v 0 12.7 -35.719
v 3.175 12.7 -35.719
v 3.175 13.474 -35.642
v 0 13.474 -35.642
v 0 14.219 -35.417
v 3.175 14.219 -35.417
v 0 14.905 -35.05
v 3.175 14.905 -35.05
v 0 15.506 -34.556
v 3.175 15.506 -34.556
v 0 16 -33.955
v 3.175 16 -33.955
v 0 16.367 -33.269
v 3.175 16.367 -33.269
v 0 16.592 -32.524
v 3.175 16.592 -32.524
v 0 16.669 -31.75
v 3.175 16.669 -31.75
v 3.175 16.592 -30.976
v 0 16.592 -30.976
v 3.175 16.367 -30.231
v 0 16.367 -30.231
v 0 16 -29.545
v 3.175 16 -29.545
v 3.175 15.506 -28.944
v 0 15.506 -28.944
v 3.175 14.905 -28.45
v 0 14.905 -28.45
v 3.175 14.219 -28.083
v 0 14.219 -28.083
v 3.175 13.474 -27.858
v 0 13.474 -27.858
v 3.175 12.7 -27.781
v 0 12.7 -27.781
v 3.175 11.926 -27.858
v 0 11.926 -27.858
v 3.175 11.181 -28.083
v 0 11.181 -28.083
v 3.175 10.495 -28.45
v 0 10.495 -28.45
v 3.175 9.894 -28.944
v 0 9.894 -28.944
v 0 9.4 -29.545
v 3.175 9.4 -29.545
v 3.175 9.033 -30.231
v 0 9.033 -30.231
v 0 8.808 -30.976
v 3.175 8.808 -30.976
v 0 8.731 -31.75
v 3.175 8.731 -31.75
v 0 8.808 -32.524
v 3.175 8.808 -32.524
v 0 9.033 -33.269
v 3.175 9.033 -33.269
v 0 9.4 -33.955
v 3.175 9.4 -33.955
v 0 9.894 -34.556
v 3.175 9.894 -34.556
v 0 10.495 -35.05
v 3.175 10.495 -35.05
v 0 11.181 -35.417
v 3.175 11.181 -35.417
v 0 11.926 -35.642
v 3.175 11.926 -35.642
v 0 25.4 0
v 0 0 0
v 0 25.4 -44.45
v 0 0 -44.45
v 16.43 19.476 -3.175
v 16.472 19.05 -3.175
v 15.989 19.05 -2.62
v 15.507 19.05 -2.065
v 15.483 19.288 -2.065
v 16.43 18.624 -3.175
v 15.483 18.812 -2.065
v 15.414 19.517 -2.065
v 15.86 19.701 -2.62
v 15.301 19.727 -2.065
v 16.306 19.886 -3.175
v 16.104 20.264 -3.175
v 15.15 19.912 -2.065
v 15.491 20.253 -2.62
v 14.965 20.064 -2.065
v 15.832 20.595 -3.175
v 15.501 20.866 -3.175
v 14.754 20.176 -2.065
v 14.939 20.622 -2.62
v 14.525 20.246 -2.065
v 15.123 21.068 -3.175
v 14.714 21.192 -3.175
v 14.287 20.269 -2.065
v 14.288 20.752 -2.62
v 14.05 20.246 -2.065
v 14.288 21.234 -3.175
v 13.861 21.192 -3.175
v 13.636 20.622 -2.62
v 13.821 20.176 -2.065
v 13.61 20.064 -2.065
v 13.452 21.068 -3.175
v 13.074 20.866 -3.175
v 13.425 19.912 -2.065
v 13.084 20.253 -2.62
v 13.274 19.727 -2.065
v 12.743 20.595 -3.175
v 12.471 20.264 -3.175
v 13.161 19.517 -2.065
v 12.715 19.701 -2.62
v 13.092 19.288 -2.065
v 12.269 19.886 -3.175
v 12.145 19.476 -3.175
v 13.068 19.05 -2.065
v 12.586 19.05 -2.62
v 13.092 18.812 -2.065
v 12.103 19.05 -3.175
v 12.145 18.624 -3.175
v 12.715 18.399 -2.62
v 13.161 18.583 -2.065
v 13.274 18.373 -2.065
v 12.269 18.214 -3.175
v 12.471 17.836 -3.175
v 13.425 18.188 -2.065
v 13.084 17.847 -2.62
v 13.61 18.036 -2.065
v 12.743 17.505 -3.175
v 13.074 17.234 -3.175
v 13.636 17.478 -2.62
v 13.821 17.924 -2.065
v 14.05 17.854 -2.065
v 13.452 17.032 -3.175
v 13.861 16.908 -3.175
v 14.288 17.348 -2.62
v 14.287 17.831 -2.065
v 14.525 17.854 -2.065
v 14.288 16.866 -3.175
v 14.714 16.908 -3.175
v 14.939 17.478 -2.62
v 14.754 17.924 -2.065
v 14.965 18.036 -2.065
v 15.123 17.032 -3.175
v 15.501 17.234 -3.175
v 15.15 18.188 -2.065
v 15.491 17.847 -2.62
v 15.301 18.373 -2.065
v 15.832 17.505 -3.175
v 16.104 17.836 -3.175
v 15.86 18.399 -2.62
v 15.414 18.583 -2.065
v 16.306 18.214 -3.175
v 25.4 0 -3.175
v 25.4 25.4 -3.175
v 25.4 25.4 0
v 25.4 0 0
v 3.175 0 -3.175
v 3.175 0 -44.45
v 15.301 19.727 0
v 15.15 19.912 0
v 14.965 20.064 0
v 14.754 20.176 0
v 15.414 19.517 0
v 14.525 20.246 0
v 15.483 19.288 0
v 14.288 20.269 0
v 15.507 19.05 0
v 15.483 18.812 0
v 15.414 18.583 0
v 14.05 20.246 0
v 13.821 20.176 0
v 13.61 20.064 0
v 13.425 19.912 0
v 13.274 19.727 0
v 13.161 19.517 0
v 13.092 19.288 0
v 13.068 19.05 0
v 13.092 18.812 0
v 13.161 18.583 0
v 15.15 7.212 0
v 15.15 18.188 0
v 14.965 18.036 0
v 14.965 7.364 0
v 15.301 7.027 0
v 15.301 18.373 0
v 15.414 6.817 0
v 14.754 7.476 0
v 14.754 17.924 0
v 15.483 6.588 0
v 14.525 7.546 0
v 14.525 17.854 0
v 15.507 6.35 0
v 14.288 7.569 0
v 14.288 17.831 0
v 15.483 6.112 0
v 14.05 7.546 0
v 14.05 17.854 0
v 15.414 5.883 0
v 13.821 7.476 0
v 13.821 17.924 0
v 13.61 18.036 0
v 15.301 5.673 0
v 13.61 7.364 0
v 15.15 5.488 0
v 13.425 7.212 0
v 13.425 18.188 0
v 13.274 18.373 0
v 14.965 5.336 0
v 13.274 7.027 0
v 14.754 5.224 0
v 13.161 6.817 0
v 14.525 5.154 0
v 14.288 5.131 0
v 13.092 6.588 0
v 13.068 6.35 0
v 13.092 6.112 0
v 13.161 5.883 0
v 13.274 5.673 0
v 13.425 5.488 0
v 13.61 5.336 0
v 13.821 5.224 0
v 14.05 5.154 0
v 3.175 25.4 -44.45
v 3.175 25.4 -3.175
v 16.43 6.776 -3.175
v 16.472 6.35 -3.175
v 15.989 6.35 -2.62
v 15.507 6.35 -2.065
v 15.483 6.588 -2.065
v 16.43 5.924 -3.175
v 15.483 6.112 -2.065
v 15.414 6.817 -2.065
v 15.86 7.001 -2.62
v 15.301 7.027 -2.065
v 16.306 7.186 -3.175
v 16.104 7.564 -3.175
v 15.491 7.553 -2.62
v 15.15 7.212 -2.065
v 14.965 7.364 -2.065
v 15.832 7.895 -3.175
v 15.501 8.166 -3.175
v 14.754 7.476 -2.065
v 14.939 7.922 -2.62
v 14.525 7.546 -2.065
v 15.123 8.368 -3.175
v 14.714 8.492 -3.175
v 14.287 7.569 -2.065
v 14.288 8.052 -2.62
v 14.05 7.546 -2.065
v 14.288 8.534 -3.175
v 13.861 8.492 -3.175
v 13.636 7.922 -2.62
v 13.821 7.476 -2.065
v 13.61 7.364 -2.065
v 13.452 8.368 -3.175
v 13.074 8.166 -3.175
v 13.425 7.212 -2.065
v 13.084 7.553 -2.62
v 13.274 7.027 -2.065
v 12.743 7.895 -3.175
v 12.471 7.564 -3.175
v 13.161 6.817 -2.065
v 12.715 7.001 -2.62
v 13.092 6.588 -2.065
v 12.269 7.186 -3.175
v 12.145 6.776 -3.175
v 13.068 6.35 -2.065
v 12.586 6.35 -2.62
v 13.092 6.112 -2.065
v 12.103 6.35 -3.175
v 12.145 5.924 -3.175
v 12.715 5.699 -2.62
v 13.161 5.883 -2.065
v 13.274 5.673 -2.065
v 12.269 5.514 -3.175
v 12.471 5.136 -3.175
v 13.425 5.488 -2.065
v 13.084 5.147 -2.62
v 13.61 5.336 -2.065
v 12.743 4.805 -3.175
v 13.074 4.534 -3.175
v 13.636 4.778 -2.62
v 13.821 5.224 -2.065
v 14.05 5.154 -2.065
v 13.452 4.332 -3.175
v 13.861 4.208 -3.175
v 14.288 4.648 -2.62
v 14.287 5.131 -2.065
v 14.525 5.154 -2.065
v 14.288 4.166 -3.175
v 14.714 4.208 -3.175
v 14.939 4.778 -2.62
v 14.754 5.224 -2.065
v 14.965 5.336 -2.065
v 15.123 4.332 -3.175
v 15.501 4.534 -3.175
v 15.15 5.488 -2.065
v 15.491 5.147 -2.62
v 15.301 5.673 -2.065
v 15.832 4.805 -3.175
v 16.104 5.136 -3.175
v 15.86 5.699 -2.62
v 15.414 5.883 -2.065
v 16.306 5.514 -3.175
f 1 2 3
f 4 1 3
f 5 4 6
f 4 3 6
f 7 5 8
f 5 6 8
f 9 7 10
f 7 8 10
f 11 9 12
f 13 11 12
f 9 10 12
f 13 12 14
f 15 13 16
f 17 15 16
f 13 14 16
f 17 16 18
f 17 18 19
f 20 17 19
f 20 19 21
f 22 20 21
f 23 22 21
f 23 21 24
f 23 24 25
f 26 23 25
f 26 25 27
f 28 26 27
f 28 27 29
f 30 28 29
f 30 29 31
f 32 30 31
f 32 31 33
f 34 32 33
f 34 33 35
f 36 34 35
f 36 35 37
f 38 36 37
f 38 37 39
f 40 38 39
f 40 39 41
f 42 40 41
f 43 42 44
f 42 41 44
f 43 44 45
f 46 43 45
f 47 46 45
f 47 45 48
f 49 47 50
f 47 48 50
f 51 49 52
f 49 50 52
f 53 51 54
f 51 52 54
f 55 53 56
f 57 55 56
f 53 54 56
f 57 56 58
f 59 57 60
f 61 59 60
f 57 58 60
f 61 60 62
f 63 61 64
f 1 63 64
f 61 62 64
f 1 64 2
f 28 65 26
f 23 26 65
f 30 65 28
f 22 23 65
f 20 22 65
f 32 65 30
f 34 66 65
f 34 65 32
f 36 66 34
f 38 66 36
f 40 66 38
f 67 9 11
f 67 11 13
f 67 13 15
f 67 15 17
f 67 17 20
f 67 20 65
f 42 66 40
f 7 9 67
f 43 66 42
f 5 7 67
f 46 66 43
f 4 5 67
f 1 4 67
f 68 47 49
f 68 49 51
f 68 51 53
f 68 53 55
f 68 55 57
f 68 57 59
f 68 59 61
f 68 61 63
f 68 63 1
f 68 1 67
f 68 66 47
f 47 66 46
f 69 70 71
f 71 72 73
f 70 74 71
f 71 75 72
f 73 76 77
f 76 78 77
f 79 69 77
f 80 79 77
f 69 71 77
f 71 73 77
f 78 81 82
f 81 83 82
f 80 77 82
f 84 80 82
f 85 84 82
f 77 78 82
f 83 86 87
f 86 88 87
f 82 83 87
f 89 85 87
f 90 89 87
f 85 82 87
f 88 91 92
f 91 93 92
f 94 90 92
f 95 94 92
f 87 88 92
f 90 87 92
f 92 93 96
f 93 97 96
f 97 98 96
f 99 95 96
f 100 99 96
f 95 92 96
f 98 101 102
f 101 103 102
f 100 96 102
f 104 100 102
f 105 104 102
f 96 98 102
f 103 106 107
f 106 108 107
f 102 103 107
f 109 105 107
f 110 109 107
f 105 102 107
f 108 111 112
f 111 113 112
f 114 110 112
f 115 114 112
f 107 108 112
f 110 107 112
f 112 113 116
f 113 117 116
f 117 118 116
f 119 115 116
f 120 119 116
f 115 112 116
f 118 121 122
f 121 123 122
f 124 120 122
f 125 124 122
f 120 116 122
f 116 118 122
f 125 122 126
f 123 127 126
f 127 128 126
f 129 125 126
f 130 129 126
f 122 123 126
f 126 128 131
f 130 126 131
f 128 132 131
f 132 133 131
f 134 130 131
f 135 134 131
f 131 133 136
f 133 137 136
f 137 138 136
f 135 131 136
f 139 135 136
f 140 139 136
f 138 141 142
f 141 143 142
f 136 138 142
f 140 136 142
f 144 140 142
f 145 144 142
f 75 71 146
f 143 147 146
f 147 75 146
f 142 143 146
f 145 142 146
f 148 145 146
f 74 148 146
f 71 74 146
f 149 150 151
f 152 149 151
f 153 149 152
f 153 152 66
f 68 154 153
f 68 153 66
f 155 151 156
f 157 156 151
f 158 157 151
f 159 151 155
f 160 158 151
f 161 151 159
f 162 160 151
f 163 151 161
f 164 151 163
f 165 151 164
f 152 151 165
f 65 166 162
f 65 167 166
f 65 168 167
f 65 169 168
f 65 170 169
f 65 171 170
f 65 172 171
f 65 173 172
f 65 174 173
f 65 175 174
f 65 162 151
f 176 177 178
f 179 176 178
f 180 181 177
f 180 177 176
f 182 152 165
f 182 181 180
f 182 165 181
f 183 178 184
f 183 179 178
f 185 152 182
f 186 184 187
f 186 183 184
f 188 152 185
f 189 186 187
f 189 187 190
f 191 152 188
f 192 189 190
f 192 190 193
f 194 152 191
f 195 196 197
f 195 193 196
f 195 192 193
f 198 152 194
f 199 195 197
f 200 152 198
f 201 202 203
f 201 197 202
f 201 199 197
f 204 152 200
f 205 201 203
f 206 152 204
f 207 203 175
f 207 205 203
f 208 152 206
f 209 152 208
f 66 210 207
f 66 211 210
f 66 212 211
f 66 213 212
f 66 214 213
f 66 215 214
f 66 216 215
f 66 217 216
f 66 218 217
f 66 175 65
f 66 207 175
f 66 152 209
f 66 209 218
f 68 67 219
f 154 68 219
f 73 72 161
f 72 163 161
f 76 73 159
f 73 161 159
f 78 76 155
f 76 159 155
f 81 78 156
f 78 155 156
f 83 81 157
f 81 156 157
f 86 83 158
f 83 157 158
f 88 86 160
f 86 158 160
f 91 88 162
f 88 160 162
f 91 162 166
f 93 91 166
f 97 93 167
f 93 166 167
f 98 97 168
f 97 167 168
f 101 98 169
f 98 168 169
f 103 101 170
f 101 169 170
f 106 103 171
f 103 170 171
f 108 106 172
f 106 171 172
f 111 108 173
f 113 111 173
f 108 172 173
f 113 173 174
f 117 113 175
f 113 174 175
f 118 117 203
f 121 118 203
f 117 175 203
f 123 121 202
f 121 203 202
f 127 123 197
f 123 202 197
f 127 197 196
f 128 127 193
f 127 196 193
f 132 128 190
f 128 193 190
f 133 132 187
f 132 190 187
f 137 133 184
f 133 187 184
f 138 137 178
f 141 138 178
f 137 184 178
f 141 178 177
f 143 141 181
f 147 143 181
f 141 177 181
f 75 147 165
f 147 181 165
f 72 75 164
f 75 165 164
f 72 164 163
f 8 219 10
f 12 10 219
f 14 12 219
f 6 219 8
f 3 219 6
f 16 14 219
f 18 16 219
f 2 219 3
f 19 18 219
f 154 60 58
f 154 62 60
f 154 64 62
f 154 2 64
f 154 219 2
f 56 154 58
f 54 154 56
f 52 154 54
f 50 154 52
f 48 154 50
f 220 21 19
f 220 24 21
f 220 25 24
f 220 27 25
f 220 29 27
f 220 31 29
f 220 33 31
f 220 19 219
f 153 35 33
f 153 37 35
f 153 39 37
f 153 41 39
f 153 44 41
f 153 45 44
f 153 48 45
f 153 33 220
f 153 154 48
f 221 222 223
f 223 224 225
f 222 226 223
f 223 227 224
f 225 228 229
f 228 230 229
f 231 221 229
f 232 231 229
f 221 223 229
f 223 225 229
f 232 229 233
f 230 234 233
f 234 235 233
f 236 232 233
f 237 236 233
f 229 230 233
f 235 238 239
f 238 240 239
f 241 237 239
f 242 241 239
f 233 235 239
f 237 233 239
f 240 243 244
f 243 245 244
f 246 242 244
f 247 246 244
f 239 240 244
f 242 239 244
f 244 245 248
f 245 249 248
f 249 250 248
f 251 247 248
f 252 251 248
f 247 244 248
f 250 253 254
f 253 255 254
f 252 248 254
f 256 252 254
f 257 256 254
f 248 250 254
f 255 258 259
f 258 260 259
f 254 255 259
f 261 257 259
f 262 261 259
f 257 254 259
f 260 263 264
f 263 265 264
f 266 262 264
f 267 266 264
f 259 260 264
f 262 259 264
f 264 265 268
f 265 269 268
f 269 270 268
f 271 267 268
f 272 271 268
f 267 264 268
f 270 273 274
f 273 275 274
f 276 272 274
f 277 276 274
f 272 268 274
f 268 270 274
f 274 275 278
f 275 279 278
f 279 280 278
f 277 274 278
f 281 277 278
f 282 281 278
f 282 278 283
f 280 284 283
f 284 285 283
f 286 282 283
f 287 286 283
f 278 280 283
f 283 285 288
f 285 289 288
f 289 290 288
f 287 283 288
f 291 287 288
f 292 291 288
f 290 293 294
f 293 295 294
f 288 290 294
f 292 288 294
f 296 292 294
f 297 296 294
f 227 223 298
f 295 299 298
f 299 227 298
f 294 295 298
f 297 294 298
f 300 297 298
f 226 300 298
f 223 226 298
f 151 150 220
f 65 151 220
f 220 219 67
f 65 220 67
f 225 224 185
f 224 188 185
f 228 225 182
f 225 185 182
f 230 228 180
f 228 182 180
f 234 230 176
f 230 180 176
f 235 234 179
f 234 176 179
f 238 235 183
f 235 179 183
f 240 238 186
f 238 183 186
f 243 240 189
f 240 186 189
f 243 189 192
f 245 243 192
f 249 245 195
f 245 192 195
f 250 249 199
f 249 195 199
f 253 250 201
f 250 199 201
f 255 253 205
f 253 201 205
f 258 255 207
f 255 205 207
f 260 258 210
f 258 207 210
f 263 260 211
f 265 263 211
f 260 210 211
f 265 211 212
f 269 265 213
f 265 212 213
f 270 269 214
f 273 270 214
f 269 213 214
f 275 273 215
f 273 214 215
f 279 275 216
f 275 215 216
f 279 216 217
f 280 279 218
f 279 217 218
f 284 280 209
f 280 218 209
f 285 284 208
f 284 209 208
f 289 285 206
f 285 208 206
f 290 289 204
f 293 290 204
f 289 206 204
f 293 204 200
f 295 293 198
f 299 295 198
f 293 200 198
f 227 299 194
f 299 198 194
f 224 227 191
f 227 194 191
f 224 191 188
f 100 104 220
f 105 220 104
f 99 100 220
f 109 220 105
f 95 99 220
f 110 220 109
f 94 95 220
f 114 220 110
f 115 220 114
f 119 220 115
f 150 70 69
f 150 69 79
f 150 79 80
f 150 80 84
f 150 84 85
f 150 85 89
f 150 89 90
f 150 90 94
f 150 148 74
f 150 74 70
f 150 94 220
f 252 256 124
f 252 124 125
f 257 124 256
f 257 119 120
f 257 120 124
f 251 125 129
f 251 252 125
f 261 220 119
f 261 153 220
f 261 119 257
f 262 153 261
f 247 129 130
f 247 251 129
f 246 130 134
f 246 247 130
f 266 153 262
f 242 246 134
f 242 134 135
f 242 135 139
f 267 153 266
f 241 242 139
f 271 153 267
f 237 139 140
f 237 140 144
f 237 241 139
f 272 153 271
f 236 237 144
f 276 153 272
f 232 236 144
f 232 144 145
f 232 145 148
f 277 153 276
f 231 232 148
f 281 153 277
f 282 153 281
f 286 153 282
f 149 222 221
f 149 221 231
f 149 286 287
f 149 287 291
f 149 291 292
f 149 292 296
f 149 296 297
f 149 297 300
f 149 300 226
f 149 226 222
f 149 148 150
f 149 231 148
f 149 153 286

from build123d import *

# Parameters (mm, degrees)
BOSS_EXTRUDE1_DEPTH                            = 25.4
SKETCH2_R                                      = 3.96875
CUT_EXTRUDE1_DEPTH                             = 4.175
CSK_FOR_2_FLAT_HEAD_MACHINE_SCREW1_D           = 2.4384
CSK_FOR_2_FLAT_HEAD_MACHINE_SCREW1_CSINK_D     = 4.3688
CSK_FOR_2_FLAT_HEAD_MACHINE_SCREW1_CSINK_ANGLE = 82


with BuildPart() as part:
    # Sketch1 → Boss-Extrude1 (new body)
    with BuildSketch(Plane(origin=(0, 0, 0), x_dir=(1, 0, 0), z_dir=(0, 1, 0))):
        Polygon((0, 0), (0, 44.45), (3.175, 44.45), (3.175, 3.175), (25.4, 3.175), (25.4, 0), align=None)
    extrude(amount=BOSS_EXTRUDE1_DEPTH)

    # Sketch2 → Cut-Extrude1 (cut, through all)
    with BuildSketch(Plane(origin=(3.175, 0, 0), x_dir=(0, 0, -1), z_dir=(1, 0, 0))):
        with Locations((31.75, 12.7)):
            Circle(SKETCH2_R)
    extrude(amount=-CUT_EXTRUDE1_DEPTH, mode=Mode.SUBTRACT)

    # CSK for #2 Flat Head Machine Screw1 (through all)
    with Locations(Plane(origin=(0, 0, -3.175), x_dir=(-1, 0, 0), z_dir=(0, 0, -1))):
        with Locations((-14.2875, 19.05), (-14.2875, 6.35)):
            CounterSinkHole(CSK_FOR_2_FLAT_HEAD_MACHINE_SCREW1_D / 2, CSK_FOR_2_FLAT_HEAD_MACHINE_SCREW1_CSINK_D / 2, counter_sink_angle=CSK_FOR_2_FLAT_HEAD_MACHINE_SCREW1_CSINK_ANGLE)


solid = part.part
